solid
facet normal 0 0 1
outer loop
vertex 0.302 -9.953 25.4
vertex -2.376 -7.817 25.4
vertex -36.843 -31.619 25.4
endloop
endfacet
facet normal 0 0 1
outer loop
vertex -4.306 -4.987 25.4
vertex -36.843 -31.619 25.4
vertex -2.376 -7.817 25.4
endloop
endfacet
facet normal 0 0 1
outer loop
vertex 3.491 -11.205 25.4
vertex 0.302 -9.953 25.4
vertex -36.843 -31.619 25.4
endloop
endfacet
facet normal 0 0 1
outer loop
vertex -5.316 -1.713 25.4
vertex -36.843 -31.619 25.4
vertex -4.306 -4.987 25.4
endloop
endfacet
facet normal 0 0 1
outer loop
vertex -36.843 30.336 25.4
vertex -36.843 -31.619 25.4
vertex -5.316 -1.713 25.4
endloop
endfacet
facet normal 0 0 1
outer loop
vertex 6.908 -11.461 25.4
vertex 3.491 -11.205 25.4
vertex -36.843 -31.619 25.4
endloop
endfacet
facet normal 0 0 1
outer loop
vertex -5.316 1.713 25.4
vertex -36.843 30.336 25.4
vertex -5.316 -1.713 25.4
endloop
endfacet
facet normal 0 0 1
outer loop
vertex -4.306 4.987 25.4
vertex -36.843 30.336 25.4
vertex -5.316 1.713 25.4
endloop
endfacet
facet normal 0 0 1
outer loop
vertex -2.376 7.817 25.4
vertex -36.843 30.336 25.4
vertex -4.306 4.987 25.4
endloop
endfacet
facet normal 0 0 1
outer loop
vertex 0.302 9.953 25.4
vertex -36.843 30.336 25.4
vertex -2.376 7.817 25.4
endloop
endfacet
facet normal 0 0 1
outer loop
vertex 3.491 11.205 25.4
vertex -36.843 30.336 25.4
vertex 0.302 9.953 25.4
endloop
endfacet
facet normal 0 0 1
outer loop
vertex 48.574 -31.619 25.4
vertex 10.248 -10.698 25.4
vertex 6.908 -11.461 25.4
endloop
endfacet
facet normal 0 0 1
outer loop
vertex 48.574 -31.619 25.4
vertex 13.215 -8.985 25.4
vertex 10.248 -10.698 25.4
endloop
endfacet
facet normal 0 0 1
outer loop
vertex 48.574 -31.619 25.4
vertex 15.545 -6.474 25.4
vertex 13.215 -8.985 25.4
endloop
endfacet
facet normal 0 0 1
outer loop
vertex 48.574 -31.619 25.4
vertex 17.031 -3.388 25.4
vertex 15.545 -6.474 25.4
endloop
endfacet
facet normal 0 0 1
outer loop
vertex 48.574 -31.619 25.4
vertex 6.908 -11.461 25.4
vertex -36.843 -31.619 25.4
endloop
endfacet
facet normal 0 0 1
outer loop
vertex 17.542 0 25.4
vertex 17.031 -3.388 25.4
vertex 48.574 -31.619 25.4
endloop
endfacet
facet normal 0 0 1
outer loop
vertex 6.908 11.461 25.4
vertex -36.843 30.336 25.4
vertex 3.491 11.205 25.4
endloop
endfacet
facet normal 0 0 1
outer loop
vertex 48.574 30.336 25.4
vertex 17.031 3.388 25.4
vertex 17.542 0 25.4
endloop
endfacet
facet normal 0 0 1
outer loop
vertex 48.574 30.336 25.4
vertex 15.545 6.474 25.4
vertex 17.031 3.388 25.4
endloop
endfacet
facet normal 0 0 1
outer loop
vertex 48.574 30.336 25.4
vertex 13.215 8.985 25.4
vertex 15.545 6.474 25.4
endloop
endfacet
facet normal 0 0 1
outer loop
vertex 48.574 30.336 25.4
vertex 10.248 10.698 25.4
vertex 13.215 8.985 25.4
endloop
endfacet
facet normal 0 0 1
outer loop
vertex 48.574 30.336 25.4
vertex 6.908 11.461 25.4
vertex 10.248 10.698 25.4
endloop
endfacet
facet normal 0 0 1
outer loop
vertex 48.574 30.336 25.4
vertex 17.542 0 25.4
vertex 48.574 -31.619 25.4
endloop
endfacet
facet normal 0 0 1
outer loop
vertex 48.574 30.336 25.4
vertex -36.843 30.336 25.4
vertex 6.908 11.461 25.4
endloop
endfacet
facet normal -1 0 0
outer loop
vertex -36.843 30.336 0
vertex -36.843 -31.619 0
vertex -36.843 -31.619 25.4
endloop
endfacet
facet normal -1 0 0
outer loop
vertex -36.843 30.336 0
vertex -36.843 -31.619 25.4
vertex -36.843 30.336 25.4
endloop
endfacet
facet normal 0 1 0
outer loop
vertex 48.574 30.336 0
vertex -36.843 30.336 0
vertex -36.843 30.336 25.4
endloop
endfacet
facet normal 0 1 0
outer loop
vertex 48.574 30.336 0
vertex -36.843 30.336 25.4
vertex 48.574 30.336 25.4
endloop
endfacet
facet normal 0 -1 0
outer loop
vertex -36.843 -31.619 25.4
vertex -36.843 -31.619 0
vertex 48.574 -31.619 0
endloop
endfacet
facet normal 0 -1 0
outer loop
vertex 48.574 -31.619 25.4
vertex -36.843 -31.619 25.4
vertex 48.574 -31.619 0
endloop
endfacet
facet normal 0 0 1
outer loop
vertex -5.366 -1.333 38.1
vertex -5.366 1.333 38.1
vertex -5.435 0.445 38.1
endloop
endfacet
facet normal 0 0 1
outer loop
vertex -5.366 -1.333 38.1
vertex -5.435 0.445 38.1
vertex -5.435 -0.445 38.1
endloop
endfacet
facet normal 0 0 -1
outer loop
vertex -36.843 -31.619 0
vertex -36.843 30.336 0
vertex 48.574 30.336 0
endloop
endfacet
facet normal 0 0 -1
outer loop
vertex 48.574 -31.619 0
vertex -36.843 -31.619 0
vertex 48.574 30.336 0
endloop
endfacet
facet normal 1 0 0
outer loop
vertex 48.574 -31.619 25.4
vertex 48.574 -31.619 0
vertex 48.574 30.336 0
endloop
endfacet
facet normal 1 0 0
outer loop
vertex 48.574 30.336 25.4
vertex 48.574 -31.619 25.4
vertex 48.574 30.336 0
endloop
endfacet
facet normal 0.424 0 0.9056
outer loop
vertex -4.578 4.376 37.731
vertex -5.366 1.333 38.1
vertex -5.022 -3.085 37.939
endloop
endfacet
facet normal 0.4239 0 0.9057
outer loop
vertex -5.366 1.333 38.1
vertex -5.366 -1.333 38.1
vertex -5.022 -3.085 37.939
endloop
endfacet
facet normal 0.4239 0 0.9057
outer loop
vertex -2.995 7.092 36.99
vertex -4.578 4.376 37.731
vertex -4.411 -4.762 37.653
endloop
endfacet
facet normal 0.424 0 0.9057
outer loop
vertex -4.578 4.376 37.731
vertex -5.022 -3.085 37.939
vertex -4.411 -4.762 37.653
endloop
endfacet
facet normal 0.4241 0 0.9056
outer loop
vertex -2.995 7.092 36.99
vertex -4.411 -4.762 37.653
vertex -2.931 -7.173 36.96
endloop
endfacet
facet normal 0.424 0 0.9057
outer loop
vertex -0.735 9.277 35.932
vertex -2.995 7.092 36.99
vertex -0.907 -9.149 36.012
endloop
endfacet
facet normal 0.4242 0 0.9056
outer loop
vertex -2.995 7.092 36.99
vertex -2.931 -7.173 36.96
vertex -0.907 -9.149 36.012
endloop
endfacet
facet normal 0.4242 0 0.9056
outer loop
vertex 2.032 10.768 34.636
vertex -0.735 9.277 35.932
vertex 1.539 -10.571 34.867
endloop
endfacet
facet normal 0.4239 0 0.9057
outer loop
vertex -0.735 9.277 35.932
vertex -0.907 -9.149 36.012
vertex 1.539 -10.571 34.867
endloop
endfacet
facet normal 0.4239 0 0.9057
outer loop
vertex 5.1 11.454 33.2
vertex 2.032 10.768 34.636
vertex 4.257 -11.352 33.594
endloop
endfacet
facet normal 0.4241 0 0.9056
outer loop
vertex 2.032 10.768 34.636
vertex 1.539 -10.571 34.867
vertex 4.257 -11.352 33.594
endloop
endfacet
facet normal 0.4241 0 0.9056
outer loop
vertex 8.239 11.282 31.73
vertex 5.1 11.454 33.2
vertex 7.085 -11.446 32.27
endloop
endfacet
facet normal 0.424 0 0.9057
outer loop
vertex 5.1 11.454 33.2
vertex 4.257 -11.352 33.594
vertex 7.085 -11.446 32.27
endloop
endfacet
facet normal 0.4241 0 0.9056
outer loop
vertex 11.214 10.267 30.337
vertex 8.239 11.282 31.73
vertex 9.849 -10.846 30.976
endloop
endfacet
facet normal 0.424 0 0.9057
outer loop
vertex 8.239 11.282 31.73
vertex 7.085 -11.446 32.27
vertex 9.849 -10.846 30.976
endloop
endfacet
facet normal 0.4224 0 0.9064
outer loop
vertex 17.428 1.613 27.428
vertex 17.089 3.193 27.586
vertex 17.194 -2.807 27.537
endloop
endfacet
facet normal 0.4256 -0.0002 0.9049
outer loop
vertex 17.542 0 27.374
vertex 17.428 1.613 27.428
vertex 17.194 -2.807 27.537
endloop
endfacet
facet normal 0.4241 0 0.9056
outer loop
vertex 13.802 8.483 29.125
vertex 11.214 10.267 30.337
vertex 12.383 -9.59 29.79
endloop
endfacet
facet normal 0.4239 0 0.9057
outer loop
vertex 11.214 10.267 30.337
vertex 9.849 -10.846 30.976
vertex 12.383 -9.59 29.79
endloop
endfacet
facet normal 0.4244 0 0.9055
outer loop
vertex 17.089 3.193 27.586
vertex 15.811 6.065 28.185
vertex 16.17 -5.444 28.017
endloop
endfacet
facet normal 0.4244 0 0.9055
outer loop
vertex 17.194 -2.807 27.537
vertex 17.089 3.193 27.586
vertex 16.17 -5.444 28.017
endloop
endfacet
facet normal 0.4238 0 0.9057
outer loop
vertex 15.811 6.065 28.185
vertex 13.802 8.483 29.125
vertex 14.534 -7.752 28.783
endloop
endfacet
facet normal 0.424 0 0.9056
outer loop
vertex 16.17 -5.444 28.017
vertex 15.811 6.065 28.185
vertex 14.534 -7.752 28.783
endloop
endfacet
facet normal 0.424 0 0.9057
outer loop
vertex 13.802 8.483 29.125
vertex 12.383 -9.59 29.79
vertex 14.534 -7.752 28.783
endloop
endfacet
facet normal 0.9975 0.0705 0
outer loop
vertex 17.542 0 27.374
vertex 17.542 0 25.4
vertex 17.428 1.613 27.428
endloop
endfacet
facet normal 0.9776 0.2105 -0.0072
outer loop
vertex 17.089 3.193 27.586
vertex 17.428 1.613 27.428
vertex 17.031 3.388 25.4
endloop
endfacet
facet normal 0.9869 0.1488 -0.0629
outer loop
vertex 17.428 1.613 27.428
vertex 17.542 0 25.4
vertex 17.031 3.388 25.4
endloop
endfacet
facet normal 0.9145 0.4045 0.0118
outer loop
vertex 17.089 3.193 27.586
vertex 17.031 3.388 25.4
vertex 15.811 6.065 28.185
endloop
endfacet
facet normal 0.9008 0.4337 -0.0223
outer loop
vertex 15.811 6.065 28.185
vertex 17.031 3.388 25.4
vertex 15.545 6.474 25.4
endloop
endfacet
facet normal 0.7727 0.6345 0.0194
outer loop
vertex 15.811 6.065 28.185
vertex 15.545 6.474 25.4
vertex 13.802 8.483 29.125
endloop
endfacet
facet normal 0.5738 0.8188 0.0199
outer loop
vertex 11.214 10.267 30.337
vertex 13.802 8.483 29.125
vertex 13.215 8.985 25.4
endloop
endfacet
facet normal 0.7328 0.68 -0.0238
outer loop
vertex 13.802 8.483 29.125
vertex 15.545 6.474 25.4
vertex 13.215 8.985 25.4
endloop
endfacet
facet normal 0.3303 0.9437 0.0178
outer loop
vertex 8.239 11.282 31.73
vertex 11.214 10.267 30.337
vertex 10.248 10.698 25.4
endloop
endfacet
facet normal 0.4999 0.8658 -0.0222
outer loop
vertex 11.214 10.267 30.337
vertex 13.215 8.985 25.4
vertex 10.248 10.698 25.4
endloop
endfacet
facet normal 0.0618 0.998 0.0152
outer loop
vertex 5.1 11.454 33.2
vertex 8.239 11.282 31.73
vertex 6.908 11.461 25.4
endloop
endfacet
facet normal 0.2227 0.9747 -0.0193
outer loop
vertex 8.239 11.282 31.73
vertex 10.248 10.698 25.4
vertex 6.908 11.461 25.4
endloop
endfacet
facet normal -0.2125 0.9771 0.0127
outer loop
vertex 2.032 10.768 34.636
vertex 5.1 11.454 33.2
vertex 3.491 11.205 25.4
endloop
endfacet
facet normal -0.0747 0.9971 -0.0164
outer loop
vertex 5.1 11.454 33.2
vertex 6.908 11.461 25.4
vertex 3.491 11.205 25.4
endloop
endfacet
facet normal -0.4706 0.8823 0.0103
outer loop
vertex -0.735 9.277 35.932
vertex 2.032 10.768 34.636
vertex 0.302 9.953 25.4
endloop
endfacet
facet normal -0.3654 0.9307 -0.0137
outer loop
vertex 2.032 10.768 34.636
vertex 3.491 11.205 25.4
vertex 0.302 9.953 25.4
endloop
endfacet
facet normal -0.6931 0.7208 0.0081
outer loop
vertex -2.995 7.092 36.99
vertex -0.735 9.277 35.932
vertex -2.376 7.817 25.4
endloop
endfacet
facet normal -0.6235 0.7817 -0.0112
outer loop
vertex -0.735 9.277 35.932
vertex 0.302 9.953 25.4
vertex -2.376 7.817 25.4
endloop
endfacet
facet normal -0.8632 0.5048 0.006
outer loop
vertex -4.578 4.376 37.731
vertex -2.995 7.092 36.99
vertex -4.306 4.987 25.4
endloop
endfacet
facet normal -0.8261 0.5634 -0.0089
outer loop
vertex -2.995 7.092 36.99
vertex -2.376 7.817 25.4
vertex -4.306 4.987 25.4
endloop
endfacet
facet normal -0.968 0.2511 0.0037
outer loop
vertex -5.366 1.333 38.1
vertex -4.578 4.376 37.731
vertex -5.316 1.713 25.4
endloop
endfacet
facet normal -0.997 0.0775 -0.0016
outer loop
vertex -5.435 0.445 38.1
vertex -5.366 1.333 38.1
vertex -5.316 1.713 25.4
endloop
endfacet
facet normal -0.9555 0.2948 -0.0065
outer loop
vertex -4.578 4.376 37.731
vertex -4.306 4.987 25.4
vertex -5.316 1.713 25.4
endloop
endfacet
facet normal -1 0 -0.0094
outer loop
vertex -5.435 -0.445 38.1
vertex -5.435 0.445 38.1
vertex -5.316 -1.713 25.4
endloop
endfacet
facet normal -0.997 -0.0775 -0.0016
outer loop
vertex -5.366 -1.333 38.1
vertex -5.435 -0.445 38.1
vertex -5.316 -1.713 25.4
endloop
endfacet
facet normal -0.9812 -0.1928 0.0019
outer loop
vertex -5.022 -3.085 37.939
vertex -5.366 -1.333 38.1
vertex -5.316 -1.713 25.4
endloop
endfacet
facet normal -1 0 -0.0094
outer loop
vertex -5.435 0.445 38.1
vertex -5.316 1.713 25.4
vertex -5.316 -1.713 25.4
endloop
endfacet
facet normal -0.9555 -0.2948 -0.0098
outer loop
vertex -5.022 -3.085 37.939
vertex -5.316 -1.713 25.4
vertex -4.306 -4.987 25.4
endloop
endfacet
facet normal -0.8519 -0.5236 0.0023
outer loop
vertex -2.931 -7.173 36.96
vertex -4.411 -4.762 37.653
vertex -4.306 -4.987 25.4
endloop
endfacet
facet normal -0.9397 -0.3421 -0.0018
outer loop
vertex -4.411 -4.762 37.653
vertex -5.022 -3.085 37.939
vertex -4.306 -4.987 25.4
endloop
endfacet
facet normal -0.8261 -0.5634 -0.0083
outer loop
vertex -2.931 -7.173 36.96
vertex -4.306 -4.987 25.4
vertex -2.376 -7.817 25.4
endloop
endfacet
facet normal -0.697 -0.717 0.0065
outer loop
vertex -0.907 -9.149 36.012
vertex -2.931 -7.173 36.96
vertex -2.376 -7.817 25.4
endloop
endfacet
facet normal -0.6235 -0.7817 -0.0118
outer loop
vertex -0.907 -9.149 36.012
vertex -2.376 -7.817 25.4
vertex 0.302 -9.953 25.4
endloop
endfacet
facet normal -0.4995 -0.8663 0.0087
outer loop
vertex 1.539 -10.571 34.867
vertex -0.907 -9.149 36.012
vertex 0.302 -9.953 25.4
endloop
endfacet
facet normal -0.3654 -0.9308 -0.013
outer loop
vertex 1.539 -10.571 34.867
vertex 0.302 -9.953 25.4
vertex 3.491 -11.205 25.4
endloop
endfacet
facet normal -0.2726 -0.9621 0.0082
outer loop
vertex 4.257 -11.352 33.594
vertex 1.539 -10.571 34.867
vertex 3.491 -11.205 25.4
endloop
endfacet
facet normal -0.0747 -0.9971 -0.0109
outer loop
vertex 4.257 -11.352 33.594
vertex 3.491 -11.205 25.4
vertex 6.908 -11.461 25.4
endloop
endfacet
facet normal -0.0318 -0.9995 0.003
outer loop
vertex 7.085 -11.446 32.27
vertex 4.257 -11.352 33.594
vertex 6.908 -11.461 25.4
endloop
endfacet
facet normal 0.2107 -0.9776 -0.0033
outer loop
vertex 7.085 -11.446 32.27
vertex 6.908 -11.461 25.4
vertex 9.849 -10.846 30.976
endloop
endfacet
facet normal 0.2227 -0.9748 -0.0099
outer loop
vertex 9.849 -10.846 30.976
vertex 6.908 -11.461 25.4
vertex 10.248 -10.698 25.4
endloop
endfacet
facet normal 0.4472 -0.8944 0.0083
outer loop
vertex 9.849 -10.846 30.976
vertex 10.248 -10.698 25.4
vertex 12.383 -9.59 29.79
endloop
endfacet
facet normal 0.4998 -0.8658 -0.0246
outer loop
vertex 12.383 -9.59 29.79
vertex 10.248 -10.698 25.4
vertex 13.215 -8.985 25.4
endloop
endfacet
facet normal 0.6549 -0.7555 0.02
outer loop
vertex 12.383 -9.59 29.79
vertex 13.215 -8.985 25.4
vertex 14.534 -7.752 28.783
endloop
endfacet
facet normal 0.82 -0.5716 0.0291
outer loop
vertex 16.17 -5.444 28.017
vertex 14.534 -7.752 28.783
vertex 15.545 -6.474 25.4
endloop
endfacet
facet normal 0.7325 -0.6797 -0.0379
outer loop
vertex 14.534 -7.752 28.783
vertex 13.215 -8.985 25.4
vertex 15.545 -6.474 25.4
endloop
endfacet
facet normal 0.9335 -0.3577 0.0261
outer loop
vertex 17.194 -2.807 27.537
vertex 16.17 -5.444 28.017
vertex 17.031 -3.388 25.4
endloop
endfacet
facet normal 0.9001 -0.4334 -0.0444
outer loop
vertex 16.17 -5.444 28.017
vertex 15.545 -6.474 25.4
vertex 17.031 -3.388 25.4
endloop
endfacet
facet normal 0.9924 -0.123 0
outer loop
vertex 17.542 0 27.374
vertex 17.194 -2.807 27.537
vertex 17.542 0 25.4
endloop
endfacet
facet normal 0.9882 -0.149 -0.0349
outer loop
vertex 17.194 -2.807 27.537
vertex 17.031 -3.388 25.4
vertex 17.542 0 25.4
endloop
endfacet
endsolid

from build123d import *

# Parameters (mm, degrees)
F0_W     = 85.417319
F0_H     = 61.955053
F1_DEPTH = 25.4
F2_R     = 11.492787
F3_DEPTH = 12.7
F5_DEPTH = 25.4


with BuildPart() as f1:
    # F0 (on Top) → F1 (new body)
    with BuildSketch(Plane.XY):
        with Locations((5.865568, -0.641545)):
            Rectangle(F0_W, F0_H)
    extrude(amount=F1_DEPTH)

    # F2 (on face) → F3 (join)
    with BuildSketch(Plane.XY.offset(25.4)):
        with Locations((6.048867, 0)):
            Circle(F2_R)
    extrude(amount=F3_DEPTH)

    # F4 (on Front) → F5 (cut, symmetric)
    with BuildSketch(Plane.XZ):
        Polygon((18.033221, 39.003748), (-6.255646, 38.51638), (18.033221, 27.144257), align=None)
    extrude(amount=F5_DEPTH, both=True, mode=Mode.SUBTRACT)


solid = f1.part
